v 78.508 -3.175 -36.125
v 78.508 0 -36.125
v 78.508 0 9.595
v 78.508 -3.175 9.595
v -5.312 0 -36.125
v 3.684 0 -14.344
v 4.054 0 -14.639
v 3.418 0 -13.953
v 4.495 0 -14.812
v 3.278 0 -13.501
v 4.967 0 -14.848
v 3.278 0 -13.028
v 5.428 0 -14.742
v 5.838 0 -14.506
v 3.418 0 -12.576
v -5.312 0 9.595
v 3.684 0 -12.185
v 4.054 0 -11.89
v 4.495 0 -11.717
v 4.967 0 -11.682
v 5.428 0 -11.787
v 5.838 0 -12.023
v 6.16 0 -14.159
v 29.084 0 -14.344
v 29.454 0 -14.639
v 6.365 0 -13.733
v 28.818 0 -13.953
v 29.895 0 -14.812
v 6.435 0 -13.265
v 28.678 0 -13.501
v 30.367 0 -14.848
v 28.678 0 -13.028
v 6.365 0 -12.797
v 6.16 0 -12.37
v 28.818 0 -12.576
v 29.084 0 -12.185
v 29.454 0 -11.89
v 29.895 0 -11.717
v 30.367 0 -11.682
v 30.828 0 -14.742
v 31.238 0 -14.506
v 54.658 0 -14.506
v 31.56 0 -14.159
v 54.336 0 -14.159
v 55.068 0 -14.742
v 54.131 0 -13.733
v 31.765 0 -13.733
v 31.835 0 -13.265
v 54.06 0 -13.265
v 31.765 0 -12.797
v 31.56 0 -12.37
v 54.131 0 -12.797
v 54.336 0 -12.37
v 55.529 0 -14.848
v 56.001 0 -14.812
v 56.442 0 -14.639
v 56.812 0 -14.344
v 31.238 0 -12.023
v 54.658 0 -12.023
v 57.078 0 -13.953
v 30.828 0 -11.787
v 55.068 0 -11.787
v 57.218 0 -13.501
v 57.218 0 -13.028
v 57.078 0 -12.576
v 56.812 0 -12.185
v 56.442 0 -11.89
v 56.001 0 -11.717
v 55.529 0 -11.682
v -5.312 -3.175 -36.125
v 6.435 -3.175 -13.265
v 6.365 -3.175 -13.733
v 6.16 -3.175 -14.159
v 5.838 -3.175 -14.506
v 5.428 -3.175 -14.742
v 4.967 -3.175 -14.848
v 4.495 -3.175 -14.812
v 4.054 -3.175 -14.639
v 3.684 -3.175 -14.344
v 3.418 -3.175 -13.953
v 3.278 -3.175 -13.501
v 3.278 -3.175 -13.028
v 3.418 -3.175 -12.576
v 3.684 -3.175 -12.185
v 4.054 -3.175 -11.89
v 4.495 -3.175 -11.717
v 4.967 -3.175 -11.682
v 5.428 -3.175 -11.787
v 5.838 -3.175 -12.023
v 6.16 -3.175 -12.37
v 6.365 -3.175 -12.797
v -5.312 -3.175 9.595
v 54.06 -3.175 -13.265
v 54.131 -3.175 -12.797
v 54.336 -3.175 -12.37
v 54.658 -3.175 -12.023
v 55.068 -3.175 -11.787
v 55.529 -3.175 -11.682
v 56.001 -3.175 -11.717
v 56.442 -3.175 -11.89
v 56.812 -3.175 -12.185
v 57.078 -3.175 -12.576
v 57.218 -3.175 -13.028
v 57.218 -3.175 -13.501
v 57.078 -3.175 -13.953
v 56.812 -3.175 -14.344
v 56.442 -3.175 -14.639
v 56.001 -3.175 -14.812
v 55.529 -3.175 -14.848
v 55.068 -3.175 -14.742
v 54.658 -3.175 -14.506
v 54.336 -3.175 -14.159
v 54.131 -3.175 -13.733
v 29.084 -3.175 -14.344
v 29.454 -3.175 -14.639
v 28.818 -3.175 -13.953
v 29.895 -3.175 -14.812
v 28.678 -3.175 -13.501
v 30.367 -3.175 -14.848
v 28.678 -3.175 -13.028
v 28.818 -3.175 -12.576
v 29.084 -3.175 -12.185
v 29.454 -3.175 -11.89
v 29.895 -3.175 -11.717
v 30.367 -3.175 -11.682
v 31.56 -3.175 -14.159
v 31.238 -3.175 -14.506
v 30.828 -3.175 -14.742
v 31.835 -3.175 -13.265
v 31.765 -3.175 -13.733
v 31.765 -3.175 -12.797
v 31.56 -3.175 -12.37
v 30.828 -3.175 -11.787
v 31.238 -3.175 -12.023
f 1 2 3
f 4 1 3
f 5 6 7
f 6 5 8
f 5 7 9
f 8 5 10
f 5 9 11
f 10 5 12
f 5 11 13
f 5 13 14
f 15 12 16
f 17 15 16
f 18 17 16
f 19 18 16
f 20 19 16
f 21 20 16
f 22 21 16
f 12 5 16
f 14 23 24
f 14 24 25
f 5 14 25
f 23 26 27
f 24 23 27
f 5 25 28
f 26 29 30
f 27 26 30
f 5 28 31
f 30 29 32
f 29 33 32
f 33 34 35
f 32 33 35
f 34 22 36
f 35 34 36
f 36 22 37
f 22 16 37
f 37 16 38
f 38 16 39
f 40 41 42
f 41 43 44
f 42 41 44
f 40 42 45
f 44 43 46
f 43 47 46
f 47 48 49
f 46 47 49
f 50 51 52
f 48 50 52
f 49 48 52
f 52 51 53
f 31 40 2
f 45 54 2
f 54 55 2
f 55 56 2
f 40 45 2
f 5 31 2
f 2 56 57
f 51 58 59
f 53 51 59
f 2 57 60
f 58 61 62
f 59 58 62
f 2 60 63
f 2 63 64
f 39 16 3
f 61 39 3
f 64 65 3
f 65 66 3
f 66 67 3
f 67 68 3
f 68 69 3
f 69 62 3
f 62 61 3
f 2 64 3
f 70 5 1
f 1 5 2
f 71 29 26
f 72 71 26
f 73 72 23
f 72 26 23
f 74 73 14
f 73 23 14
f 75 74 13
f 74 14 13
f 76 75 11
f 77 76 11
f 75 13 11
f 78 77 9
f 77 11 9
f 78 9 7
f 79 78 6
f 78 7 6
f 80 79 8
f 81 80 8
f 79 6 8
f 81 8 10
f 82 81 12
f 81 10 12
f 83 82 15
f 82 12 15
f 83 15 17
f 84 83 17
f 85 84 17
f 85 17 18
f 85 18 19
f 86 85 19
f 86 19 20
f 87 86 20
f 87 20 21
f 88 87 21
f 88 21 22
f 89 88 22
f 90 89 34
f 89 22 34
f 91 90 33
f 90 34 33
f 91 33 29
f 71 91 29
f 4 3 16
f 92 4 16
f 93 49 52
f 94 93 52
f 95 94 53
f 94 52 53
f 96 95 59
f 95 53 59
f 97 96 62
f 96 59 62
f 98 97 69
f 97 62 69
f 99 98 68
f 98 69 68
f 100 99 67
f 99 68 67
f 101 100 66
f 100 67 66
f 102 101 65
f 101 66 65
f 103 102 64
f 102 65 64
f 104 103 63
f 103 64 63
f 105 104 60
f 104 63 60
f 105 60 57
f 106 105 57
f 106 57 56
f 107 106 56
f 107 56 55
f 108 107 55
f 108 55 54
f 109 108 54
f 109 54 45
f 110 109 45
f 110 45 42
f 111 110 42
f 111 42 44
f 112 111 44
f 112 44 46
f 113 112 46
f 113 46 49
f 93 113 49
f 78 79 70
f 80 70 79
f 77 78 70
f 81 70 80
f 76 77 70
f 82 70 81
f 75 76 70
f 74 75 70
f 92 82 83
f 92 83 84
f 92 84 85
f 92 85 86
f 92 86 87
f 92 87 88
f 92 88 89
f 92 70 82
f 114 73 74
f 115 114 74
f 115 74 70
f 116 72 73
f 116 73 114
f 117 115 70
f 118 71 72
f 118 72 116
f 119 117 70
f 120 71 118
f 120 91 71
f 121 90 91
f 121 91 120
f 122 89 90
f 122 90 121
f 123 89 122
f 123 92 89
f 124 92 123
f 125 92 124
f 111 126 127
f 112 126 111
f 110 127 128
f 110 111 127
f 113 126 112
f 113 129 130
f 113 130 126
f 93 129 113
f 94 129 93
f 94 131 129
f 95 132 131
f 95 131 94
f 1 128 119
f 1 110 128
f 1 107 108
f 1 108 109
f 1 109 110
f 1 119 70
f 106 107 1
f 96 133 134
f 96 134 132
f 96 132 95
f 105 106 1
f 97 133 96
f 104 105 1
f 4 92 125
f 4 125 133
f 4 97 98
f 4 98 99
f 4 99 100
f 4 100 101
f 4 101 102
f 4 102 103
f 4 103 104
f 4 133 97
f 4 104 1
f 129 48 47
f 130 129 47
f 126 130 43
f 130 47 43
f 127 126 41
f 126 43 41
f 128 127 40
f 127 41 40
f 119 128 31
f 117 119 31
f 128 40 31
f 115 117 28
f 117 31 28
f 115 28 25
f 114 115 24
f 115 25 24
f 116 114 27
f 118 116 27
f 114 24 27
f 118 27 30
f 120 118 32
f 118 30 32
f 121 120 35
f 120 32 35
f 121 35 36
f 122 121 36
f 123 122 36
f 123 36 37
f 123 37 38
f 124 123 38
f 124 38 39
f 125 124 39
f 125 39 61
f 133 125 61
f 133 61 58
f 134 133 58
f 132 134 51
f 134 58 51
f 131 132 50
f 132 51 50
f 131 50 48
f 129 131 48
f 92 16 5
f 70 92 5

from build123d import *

# Parameters (mm, degrees)
F1_DEPTH = 3.175
F2_DEPTH = 3.175


with BuildPart() as f1:
    # F0 (on Front) → F1 (new body)
    with BuildSketch(Plane.XZ):
        Polygon((-1.5020562172, 9.5954131643), (-1.5020562172, 5.7854131643), (30.2479437828, 5.7854131643), (55.6479437828, 5.7854131643), (74.6979437828, 5.7854131643), (74.6979437828, 9.5954131643), align=None)
        Polygon((74.6979437828, -32.3145868357), (74.6979437828, -36.1245868357), (78.5079437828, -36.1245868357), (78.5079437828, 9.5954131643), (74.6979437828, 9.5954131643), (74.6979437828, 5.7854131643), (74.6979437828, -13.2645868357), align=None)
        Polygon((30.2479437828, -32.3145868357), (-1.5020562172, -32.3145868357), (-1.5020562172, -36.1245868357), (74.6979437828, -36.1245868357), (74.6979437828, -32.3145868357), (55.6479437828, -32.3145868357), align=None)
        Polygon((-1.5020562172, -36.1245868357), (-1.5020562172, -32.3145868357), (-1.5020562172, -13.2645868357), (-1.5020562172, 5.7854131643), (-1.5020562172, 9.5954131643), (-5.3120562172, 9.5954131643), (-5.3120562172, -36.1245868357), align=None)
        with BuildLine():
            ThreePointArc((36.5979437828, -13.2645868357), (38.257752582, -21.0417167691), (42.9479437828, -27.4636184928))
            ThreePointArc((42.9479437828, -27.4636184928), (47.6381349836, -21.0417167691), (49.2979437828, -13.2645868357))
            Line((49.2979437828, -13.2645868357), (36.5979437828, -13.2645868357))
        make_face()
        with BuildLine():
            ThreePointArc((36.5979437828, -13.2645868357), (30.2479437828, -6.9145868357), (23.8979437828, -13.2645868357))
            Line((23.8979437828, -13.2645868357), (28.6604437828, -13.2645868357))
            ThreePointArc((28.6604437828, -13.2645868357), (30.2479437828, -11.6770868357), (31.8354437828, -13.2645868357))
            Line((31.8354437828, -13.2645868357), (36.5979437828, -13.2645868357))
        make_face()
        with BuildLine():
            Line((28.6604437828, -13.2645868357), (23.8979437828, -13.2645868357))
            ThreePointArc((23.8979437828, -13.2645868357), (30.2479437828, -19.6145868357), (36.5979437828, -13.2645868357))
            Line((36.5979437828, -13.2645868357), (31.8354437828, -13.2645868357))
            ThreePointArc((31.8354437828, -13.2645868357), (30.2479437828, -14.8520868357), (28.6604437828, -13.2645868357))
        make_face()
        with BuildLine():
            ThreePointArc((11.1979437828, -13.2645868357), (16.7775596012, -26.7349710173), (30.2479437828, -32.3145868357))
            ThreePointArc((30.2479437828, -32.3145868357), (37.045404593, -31.060570274), (42.9479437828, -27.4636184928))
            ThreePointArc((42.9479437828, -27.4636184928), (38.257752582, -21.0417167691), (36.5979437828, -13.2645868357))
            ThreePointArc((36.5979437828, -13.2645868357), (30.2479437828, -19.6145868357), (23.8979437828, -13.2645868357))
            Line((23.8979437828, -13.2645868357), (11.1979437828, -13.2645868357))
        make_face()
        with BuildLine():
            ThreePointArc((30.2479437828, 5.7854131643), (16.7775596012, 0.2057973459), (11.1979437828, -13.2645868357))
            Line((11.1979437828, -13.2645868357), (23.8979437828, -13.2645868357))
            ThreePointArc((23.8979437828, -13.2645868357), (30.2479437828, -6.9145868357), (36.5979437828, -13.2645868357))
            ThreePointArc((36.5979437828, -13.2645868357), (38.257752582, -5.4874569024), (42.9479437828, 0.9344448214))
            ThreePointArc((42.9479437828, 0.9344448214), (37.045404593, 4.5313966025), (30.2479437828, 5.7854131643))
        make_face()
        with BuildLine():
            Line((36.5979437828, -13.2645868357), (49.2979437828, -13.2645868357))
            ThreePointArc((49.2979437828, -13.2645868357), (47.6381349836, -5.4874569024), (42.9479437828, 0.9344448214))
            ThreePointArc((42.9479437828, 0.9344448214), (38.257752582, -5.4874569024), (36.5979437828, -13.2645868357))
        make_face()
        with BuildLine():
            ThreePointArc((42.9479437828, -27.4636184928), (48.8504829726, -31.060570274), (55.6479437828, -32.3145868357))
            ThreePointArc((55.6479437828, -32.3145868357), (69.1183279644, -26.7349710173), (74.6979437828, -13.2645868357))
            Line((74.6979437828, -13.2645868357), (57.2354437828, -13.2645868357))
            ThreePointArc((57.2354437828, -13.2645868357), (55.6479437828, -14.8520868357), (54.0604437828, -13.2645868357))
            Line((54.0604437828, -13.2645868357), (49.2979437828, -13.2645868357))
            ThreePointArc((49.2979437828, -13.2645868357), (47.6381349836, -21.0417167691), (42.9479437828, -27.4636184928))
        make_face()
        with BuildLine():
            ThreePointArc((42.9479437828, -27.4636184928), (37.045404593, -31.060570274), (30.2479437828, -32.3145868357))
            Line((30.2479437828, -32.3145868357), (55.6479437828, -32.3145868357))
            ThreePointArc((55.6479437828, -32.3145868357), (48.8504829726, -31.060570274), (42.9479437828, -27.4636184928))
        make_face()
    extrude(amount=F1_DEPTH)

    # F0 (on Front) → F2 (join)
    with BuildSketch(Plane.XZ):
        with BuildLine():
            Line((-1.5020562172, 5.7854131643), (-1.5020562172, -13.2645868357))
            ThreePointArc((-1.5020562172, -13.2645868357), (4.8479437828, -6.9145868357), (11.1979437828, -13.2645868357))
            ThreePointArc((11.1979437828, -13.2645868357), (16.7775596012, 0.2057973459), (30.2479437828, 5.7854131643))
            Line((30.2479437828, 5.7854131643), (-1.5020562172, 5.7854131643))
        make_face()
        with BuildLine():
            Line((3.2604437828, -13.2645868357), (-1.5020562172, -13.2645868357))
            ThreePointArc((-1.5020562172, -13.2645868357), (4.8479437828, -19.6145868357), (11.1979437828, -13.2645868357))
            Line((11.1979437828, -13.2645868357), (6.4354437828, -13.2645868357))
            ThreePointArc((6.4354437828, -13.2645868357), (4.8479437828, -14.8520868357), (3.2604437828, -13.2645868357))
        make_face()
        with BuildLine():
            ThreePointArc((11.1979437828, -13.2645868357), (4.8479437828, -6.9145868357), (-1.5020562172, -13.2645868357))
            Line((-1.5020562172, -13.2645868357), (3.2604437828, -13.2645868357))
            ThreePointArc((3.2604437828, -13.2645868357), (4.8479437828, -11.6770868357), (6.4354437828, -13.2645868357))
            Line((6.4354437828, -13.2645868357), (11.1979437828, -13.2645868357))
        make_face()
        with BuildLine():
            Line((-1.5020562172, -13.2645868357), (-1.5020562172, -32.3145868357))
            Line((-1.5020562172, -32.3145868357), (30.2479437828, -32.3145868357))
            ThreePointArc((30.2479437828, -32.3145868357), (16.7775596012, -26.7349710173), (11.1979437828, -13.2645868357))
            ThreePointArc((11.1979437828, -13.2645868357), (4.8479437828, -19.6145868357), (-1.5020562172, -13.2645868357))
        make_face()
        with BuildLine():
            Line((55.6479437828, 5.7854131643), (30.2479437828, 5.7854131643))
            ThreePointArc((30.2479437828, 5.7854131643), (37.045404593, 4.5313966025), (42.9479437828, 0.9344448214))
            ThreePointArc((42.9479437828, 0.9344448214), (48.8504829726, 4.5313966025), (55.6479437828, 5.7854131643))
        make_face()
        with BuildLine():
            Line((57.2354437828, -13.2645868357), (74.6979437828, -13.2645868357))
            ThreePointArc((74.6979437828, -13.2645868357), (69.1183279644, 0.2057973459), (55.6479437828, 5.7854131643))
            ThreePointArc((55.6479437828, 5.7854131643), (48.8504829726, 4.5313966025), (42.9479437828, 0.9344448214))
            ThreePointArc((42.9479437828, 0.9344448214), (47.6381349836, -5.4874569024), (49.2979437828, -13.2645868357))
            Line((49.2979437828, -13.2645868357), (54.0604437828, -13.2645868357))
            ThreePointArc((54.0604437828, -13.2645868357), (55.6479437828, -11.6770868357), (57.2354437828, -13.2645868357))
        make_face()
        with BuildLine():
            ThreePointArc((74.6979437828, -13.2645868357), (69.1183279644, -26.7349710173), (55.6479437828, -32.3145868357))
            Line((55.6479437828, -32.3145868357), (74.6979437828, -32.3145868357))
            Line((74.6979437828, -32.3145868357), (74.6979437828, -13.2645868357))
        make_face()
        with BuildLine():
            ThreePointArc((55.6479437828, 5.7854131643), (69.1183279644, 0.2057973459), (74.6979437828, -13.2645868357))
            Line((74.6979437828, -13.2645868357), (74.6979437828, 5.7854131643))
            Line((74.6979437828, 5.7854131643), (55.6479437828, 5.7854131643))
        make_face()
    extrude(amount=F2_DEPTH)


solid = f1.part
